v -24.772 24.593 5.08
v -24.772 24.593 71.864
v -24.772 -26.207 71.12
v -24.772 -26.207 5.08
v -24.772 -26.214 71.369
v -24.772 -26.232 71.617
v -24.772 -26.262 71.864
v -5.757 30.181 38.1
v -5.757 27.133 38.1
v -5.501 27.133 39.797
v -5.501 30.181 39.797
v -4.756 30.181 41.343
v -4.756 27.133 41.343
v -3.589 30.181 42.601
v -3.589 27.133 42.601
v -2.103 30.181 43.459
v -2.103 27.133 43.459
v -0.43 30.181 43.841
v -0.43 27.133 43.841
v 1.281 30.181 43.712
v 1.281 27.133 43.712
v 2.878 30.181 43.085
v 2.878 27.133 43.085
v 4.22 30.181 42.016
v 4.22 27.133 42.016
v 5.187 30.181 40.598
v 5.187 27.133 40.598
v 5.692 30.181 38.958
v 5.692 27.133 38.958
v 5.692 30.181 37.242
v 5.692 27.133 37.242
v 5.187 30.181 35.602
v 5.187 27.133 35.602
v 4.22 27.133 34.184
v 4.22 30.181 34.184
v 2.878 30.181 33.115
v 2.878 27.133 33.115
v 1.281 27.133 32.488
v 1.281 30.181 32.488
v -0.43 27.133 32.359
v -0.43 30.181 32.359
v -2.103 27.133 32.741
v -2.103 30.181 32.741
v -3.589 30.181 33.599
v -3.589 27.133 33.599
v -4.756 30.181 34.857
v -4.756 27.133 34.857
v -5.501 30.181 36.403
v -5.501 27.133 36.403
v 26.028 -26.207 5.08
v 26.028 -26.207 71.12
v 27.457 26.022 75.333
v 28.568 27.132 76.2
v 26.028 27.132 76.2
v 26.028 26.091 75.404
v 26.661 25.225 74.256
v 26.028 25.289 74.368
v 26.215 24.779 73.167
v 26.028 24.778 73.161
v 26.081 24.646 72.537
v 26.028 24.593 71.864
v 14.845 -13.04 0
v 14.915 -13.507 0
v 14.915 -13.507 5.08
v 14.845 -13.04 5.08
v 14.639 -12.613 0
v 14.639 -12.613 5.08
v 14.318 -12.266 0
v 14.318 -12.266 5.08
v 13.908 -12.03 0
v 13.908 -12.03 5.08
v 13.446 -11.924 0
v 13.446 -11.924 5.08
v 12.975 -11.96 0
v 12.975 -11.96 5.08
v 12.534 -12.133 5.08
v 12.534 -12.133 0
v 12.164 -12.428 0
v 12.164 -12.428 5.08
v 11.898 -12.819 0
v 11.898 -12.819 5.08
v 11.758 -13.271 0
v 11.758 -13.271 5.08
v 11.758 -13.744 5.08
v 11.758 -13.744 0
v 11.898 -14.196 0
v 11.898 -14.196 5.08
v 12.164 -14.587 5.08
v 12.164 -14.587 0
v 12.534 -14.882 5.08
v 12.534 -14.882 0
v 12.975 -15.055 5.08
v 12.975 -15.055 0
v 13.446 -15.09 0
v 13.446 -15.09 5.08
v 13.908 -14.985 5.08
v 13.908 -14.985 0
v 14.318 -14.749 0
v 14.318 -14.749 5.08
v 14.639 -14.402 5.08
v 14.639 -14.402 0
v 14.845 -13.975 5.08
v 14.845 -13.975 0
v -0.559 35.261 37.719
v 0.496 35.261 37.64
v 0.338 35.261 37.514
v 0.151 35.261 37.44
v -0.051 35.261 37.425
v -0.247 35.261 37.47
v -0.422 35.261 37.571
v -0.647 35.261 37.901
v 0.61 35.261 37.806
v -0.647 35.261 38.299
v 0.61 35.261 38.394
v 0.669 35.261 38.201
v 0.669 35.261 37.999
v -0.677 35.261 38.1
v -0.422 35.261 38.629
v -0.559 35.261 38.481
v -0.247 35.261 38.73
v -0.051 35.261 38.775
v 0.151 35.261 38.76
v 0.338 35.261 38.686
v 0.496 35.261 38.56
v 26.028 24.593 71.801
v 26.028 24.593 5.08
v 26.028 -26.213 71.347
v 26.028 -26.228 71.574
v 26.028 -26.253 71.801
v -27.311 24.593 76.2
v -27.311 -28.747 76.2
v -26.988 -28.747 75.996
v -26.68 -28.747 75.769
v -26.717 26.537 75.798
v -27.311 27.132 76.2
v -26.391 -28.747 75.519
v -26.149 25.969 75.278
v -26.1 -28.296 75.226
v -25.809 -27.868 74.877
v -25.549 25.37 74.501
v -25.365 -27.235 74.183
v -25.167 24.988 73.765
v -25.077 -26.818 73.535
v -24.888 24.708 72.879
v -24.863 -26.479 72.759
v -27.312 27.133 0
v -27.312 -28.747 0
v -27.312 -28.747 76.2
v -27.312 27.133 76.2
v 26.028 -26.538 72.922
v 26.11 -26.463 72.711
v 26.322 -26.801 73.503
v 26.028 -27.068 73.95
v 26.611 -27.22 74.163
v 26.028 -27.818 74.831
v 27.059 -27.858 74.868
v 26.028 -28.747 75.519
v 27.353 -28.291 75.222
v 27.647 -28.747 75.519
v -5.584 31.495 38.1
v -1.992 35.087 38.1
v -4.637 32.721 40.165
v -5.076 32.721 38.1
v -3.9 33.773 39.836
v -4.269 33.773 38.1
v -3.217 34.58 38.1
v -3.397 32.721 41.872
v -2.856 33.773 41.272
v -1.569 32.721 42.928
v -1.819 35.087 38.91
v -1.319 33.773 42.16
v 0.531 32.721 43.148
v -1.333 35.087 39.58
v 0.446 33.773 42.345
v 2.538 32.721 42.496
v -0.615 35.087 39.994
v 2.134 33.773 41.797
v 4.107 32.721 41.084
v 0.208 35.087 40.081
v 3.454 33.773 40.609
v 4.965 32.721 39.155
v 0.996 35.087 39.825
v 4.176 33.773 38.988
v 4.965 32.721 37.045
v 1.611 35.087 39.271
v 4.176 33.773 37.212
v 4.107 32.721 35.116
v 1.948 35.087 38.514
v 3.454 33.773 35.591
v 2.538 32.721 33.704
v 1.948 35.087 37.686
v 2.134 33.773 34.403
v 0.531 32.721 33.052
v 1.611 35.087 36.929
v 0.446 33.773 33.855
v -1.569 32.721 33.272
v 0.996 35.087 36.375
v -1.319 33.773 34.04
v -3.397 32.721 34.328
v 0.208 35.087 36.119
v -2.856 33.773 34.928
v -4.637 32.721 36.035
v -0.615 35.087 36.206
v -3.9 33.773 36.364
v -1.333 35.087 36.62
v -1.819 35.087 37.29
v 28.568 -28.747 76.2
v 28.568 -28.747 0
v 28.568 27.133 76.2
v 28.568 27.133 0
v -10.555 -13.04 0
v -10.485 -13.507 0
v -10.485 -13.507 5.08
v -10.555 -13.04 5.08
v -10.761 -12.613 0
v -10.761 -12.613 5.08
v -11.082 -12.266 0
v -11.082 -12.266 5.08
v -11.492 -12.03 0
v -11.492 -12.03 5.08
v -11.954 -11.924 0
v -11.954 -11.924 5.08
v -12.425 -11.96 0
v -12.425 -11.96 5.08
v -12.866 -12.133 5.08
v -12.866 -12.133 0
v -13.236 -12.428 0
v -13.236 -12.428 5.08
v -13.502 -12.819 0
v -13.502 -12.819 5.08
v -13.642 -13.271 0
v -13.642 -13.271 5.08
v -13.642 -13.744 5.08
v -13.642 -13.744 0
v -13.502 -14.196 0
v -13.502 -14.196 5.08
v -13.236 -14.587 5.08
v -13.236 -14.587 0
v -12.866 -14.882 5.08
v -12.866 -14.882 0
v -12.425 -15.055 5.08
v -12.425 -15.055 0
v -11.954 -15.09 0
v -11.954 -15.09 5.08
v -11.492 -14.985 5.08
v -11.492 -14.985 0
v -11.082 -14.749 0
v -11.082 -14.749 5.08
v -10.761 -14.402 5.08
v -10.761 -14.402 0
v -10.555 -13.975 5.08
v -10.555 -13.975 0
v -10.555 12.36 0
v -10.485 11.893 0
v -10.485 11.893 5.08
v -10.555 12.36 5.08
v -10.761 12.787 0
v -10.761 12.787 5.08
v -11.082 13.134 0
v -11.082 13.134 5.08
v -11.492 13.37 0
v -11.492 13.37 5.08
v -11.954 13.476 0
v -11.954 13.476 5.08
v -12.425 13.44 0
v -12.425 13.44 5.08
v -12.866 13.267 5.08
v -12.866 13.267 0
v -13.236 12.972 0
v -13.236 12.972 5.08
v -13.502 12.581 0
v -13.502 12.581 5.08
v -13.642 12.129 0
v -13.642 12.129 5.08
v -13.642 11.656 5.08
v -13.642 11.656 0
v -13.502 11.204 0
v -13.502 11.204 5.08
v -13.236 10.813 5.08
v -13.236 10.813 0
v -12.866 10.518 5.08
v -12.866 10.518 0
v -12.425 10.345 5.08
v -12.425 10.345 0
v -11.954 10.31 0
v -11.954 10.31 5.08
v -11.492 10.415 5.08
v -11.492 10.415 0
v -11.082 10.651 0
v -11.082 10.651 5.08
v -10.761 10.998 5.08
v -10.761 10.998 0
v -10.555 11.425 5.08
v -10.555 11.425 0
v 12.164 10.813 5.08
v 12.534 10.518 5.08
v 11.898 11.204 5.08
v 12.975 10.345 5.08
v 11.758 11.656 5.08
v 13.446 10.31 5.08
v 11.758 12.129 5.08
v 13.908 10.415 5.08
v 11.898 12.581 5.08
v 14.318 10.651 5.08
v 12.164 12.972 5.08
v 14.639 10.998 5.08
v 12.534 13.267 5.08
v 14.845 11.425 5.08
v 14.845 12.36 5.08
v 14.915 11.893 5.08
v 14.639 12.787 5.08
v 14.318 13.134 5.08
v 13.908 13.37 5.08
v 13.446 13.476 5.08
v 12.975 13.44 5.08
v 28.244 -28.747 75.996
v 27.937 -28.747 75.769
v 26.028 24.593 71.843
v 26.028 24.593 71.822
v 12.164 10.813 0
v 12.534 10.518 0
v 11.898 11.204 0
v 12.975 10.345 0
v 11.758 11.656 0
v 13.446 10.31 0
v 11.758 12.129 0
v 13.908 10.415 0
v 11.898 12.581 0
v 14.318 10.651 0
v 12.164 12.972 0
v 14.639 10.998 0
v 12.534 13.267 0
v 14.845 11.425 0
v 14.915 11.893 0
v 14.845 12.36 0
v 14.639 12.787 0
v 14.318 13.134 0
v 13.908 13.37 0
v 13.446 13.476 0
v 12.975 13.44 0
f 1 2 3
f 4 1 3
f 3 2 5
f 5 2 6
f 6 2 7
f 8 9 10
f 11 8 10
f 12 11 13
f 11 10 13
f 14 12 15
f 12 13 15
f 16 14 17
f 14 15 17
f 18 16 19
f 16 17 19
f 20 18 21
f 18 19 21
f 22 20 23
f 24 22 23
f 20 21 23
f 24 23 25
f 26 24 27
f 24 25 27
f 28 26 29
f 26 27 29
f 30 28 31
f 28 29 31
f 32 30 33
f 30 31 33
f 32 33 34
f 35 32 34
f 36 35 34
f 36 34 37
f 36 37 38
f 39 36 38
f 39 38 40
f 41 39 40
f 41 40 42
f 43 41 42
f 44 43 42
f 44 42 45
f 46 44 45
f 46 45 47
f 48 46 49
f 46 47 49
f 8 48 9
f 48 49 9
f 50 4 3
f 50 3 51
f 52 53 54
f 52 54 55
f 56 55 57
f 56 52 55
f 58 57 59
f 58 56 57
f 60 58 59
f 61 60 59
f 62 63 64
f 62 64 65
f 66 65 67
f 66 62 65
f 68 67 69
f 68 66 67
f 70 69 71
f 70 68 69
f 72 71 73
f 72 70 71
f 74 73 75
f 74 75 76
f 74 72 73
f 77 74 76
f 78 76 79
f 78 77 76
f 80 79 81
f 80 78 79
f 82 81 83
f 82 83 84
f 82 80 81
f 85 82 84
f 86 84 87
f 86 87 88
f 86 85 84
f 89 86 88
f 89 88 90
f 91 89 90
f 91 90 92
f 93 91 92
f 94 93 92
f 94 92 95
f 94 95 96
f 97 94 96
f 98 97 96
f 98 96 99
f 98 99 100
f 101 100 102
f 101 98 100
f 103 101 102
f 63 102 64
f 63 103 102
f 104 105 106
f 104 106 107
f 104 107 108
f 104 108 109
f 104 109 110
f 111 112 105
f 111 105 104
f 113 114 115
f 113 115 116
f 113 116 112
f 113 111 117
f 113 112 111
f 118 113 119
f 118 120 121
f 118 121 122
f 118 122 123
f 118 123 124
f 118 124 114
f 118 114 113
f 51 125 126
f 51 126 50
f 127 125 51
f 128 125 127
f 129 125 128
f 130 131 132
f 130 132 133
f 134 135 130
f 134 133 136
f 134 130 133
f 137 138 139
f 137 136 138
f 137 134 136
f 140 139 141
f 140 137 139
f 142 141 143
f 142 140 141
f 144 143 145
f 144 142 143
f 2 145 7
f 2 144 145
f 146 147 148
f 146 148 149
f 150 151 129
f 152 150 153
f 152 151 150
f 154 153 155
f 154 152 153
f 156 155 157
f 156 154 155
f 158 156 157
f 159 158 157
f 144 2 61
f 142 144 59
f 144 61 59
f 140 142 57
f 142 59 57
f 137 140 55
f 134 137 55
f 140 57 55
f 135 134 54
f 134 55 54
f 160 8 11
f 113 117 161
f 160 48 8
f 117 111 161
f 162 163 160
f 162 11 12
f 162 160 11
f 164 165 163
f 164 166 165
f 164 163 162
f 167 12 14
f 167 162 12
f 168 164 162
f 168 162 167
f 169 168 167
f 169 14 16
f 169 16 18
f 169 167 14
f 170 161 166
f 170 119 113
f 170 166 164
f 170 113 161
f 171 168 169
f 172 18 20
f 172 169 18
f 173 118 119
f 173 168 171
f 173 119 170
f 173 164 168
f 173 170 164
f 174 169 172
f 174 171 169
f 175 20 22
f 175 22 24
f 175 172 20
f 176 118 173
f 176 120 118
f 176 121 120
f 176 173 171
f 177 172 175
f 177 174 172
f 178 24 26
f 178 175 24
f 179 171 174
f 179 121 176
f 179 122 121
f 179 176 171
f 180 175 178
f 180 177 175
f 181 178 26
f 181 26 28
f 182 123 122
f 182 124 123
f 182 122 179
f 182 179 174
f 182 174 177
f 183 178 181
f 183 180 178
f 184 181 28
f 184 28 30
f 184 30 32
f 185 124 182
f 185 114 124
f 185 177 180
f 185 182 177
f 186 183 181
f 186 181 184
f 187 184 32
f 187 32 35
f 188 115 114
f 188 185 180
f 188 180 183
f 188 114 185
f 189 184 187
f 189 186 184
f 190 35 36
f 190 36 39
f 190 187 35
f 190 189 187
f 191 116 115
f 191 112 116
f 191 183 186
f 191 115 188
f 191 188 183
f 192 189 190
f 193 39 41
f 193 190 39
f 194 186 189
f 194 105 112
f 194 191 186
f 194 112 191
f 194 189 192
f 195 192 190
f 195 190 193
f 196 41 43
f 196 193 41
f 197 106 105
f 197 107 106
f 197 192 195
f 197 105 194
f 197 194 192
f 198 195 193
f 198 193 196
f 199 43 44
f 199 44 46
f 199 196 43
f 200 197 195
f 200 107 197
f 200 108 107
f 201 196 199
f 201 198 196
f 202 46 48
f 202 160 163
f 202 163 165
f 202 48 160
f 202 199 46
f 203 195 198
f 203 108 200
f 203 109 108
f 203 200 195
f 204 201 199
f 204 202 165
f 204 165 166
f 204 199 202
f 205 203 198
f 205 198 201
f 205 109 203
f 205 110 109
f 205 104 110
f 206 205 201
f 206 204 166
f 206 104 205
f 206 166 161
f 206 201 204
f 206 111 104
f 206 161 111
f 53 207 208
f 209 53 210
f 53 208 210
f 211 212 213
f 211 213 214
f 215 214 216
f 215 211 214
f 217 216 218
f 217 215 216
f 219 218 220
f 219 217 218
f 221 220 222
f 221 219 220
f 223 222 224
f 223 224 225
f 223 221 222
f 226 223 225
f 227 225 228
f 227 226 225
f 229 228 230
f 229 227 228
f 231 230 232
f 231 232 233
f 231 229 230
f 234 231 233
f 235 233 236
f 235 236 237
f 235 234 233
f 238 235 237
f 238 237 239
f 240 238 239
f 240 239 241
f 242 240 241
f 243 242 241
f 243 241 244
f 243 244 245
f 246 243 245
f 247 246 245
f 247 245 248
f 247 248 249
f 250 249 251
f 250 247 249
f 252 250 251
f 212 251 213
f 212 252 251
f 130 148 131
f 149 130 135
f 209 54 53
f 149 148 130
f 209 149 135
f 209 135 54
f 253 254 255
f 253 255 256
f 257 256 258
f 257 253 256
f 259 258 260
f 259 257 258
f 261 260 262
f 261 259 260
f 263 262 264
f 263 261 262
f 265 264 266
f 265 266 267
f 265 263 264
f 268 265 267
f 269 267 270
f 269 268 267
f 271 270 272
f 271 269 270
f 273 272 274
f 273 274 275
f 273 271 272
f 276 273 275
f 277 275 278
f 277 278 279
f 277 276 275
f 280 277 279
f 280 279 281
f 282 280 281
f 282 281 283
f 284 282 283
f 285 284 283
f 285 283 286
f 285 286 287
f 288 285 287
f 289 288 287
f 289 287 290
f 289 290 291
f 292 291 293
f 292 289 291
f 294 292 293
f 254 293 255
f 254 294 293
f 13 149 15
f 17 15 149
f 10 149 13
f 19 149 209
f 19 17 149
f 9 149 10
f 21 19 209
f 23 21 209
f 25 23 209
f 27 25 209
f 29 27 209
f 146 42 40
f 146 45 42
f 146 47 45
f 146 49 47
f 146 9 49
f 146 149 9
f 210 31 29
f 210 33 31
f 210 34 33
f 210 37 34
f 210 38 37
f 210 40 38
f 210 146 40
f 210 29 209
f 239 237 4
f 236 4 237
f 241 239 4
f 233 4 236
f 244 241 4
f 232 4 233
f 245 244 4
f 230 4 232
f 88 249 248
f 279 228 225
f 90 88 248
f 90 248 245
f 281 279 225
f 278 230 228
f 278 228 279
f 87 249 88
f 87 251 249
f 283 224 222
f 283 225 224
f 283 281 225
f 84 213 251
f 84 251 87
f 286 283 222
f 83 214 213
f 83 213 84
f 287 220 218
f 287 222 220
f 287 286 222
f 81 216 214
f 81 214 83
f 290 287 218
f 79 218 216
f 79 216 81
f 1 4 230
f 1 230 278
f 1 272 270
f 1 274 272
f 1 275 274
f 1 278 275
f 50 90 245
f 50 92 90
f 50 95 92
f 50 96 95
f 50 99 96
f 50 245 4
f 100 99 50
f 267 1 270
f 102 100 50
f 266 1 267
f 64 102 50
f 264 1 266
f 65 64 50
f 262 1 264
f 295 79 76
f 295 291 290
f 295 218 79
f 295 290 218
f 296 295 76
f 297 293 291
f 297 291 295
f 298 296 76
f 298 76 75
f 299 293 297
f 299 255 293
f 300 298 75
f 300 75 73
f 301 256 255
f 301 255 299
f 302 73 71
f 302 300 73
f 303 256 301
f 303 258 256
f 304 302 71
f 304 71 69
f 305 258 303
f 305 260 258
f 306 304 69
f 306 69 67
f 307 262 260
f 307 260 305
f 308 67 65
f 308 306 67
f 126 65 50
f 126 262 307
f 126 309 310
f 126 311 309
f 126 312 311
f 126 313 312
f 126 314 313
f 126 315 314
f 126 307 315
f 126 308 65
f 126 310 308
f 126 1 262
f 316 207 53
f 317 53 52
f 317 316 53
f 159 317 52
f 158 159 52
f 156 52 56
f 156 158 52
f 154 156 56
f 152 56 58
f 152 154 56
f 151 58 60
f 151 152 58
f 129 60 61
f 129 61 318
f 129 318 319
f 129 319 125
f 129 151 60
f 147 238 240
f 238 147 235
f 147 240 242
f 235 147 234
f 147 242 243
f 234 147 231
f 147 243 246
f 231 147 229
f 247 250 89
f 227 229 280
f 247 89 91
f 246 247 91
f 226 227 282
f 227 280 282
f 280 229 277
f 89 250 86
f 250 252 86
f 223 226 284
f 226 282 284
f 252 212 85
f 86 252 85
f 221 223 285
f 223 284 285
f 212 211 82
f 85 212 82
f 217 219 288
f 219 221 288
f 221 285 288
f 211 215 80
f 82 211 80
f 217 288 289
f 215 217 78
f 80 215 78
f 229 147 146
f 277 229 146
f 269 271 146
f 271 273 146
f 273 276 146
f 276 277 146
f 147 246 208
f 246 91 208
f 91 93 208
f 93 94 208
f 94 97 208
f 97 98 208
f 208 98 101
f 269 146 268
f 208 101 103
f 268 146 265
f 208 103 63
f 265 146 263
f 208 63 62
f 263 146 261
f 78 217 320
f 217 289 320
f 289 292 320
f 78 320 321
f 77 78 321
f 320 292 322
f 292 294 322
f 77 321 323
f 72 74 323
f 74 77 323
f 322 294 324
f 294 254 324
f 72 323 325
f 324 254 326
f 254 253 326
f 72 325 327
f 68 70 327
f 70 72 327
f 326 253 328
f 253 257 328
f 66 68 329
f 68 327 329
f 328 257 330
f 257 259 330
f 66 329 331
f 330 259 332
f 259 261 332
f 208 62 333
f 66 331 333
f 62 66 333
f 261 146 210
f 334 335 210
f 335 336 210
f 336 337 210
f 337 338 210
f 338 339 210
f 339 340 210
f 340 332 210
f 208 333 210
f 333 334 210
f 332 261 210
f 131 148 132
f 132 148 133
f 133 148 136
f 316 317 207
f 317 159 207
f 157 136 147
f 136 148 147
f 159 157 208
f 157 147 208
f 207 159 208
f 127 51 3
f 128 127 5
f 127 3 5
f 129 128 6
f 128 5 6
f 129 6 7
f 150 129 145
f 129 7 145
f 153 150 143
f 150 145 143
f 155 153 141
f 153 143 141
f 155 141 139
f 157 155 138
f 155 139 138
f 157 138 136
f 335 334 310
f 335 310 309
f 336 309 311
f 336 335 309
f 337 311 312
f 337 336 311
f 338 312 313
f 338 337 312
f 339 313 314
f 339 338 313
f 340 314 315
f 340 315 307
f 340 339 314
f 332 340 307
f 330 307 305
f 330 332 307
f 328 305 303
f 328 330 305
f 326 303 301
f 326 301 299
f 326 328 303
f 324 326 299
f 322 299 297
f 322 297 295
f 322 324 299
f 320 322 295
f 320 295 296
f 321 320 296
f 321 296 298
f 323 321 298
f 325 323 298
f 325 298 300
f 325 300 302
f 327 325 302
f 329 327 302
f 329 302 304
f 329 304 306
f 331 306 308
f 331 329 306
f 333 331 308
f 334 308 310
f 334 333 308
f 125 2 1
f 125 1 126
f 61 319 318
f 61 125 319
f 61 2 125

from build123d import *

# Parameters (mm, degrees)
F0_W         = 50.8
F0_H         = 50.8
F0_R         = 1.5875
F1_DEPTH     = 5.08
F0_W_2       = 55.88
F0_H_2       = 55.88
F2_DEPTH     = 76.2
F3_T1_DEPTH  = 50.8
F4_T4_DEPTH  = 64.3399164321
F4_S5_R      = 5.0800000001
F4_T6_DEPTH  = 34
F5_T4_DEPTH  = 64.3391166785
F5_S5_R      = 5.0813656856
F5_T6_DEPTH  = 34
F6_T4_DEPTH  = 77.8762455026
F6_S6_R      = 5.0800000001
F6_T7_DEPTH  = 41
F6_T11_DEPTH = 77.8762455026
F6_S13_R     = 5.081365685
F6_T14_DEPTH = 41
F7_R         = 5.7567075364
F8_DEPTH     = 8.128
F9_R         = 5.08


# Not quite as in the source:
# - a fillet or chamfer that OpenCascade refuses, or shapes differently, is made with other operations: its cross-section is extruded or revolved along the edge and cut away or added


with BuildPart() as f1:
    # F0 (on Top) → F1 (new body)
    with BuildSketch(Plane.XY):
        with Locations((0.627800245, -0.8074334759)):
            Rectangle(F0_W, F0_H)
        with Locations((-12.072199755, -13.5074334759)):
            Circle(F0_R, mode=Mode.SUBTRACT)
        with Locations((13.327800245, -13.5074334759)):
            Circle(F0_R, mode=Mode.SUBTRACT)
        with Locations((-12.072199755, 11.8925665241)):
            Circle(F0_R, mode=Mode.SUBTRACT)
        with Locations((13.327800245, 11.8925665241)):
            Circle(F0_R, mode=Mode.SUBTRACT)
    extrude(amount=F1_DEPTH)

    # F0 (on Top) → F2 (join)
    with BuildSketch(Plane.XY):
        with Locations((0.627800245, -0.8074334759)):
            Rectangle(F0_W_2, F0_H_2)
        with Locations((0.627800245, -0.8074334759)):
            Rectangle(F0_W, F0_H, mode=Mode.SUBTRACT)
    extrude(amount=F2_DEPTH)

    # F3: fillet of radius 5.08 on 1 edges, made by hand

    # F3_s2 → F3_t1 (cut)
    with BuildSketch(Plane.YZ.offset(-24.772199755)):
        with BuildLine():
            ThreePointArc((-26.2074334759, 71.12), (-27.6953310275, 74.7121024484), (-31.2874334759, 76.2))
            Line((-31.2874334759, 76.2), (-26.2074334759, 76.2))
            Line((-26.2074334759, 76.2), (-26.2074334759, 71.12))
        make_face()
    extrude(amount=F3_T1_DEPTH, mode=Mode.SUBTRACT)

    # F4: fillet of radius 5.08 on 1 edges, made by hand


with BuildPart() as f4_tool2:
    # F4_s3 → F4_t4 (new body)
    with BuildSketch(Plane.XZ.offset(-24.5925665241)):
        with BuildLine():
            ThreePointArc((-27.311999717, 76.2003463882), (-25.4524342775, 74.3404748362), (-24.771799755, 71.8000334454))
            Line((-24.771799755, 71.8000334454), (-24.2636631865, 71.8000334454))
            ThreePointArc((-24.2636631865, 71.8000334454), (-24.2640631865, 74.0000167227), (-24.2640631865, 76.2))
            Line((-24.2640631865, 76.2), (-24.772199755, 76.7081365685))
            ThreePointArc((-24.772199755, 76.7081365685), (-26.042099736, 76.7081365685), (-27.0578831447, 76.6403776825))
            Line((-27.0578831447, 76.6403776825), (-27.311999717, 76.2003463882))
        make_face()
    extrude(amount=F4_T4_DEPTH)

    # F4_s5 → F4_t6 (cut, symmetric)
    with BuildSketch(Plane.YZ.offset(-25.8)):
        with Locations((-31.287433476, 71.1199999999)):
            Circle(F4_S5_R)
    extrude(amount=F4_T6_DEPTH, both=True, mode=Mode.SUBTRACT)


with BuildPart() as f1_1:
    add(f1.part)

    # F4_t1: cut F4_tool2
    add(f4_tool2.part, mode=Mode.SUBTRACT)

    # F5: fillet of radius 5.08 on 1 edges, made by hand


with BuildPart() as f5_tool2:
    # F5_s3 → F5_t4 (new body)
    with BuildSketch(Plane.YZ.offset(26.027800245)):
        with BuildLine():
            ThreePointArc((24.5921665241, 71.8000334454), (25.2728010465, 74.3404748362), (27.1323664861, 76.2003463882))
            Line((27.1323664861, 76.2003463882), (26.8782499137, 76.6403776825))
            ThreePointArc((26.8782499137, 76.6403776825), (25.8624665051, 76.7081365685), (24.5925665241, 76.7081365685))
            Line((24.5925665241, 76.7081365685), (24.0844299555, 76.2))
            ThreePointArc((24.0844299555, 76.2), (24.0844299555, 74.0000167227), (24.0840299555, 71.8000334454))
            Line((24.0840299555, 71.8000334454), (24.5921665241, 71.8000334454))
        make_face()
    extrude(amount=-F5_T4_DEPTH)

    # F5_s5 → F5_t6 (cut, symmetric)
    with BuildSketch(Plane.XZ.offset(-25.6)):
        with Locations((-29.8531654406, 71.8000334452)):
            Circle(F5_S5_R)
    extrude(amount=F5_T6_DEPTH, both=True, mode=Mode.SUBTRACT)


with BuildPart() as f1_2:
    add(f1_1.part)

    # F5_t1: cut F5_tool2
    add(f5_tool2.part, mode=Mode.SUBTRACT)

    # F6: fillet of radius 5.08 on 1 edges, made by hand


with BuildPart() as f6_tool2:
    # F6_s3 → F6_t4 (new body)
    with BuildSketch(Plane.XZ.offset(39.745956104)):
        with BuildLine():
            ThreePointArc((28.567800245, 76.2), (26.7083911938, 74.3405909488), (26.027800245, 71.8005909488))
            Line((26.027800245, 71.8005909488), (26.027800245, 76.2))
            Line((26.027800245, 76.2), (28.567800245, 76.2))
        make_face()
    extrude(amount=-F6_T4_DEPTH)

    split(bisect_by=Plane.XZ.offset(-24.5925665241), keep=Keep.TOP)

    # F6_s6 → F6_t7 (cut, symmetric)
    with BuildSketch(Plane.YZ.offset(27.3)):
        with Locations((-31.287433476, 71.1199999999)):
            Circle(F6_S6_R)
    extrude(amount=F6_T7_DEPTH, both=True, mode=Mode.SUBTRACT)


with BuildPart() as f1_3:
    add(f1_2.part)

    # F6_t1: cut F6_tool2
    add(f6_tool2.part, mode=Mode.SUBTRACT)


with BuildPart() as f6_tool9:
    # F6_s10 → F6_t11 (new body)
    with BuildSketch(Plane.XZ.offset(39.745956104)):
        with BuildLine():
            ThreePointArc((28.567800245, 76.2), (26.7083911938, 74.3405909488), (26.027800245, 71.8005909488))
            Line((26.027800245, 71.8005909488), (26.027800245, 76.2))
            Line((26.027800245, 76.2), (28.567800245, 76.2))
        make_face()
    extrude(amount=-F6_T11_DEPTH)

    split(bisect_by=Plane.XZ.offset(-24.5925665241), keep=Keep.BOTTOM)

    # F6_s13 → F6_t14 (cut, symmetric)
    with BuildSketch(Plane.YZ.offset(27.3)):
        with Locations((29.6735322091, 71.8000334456)):
            Circle(F6_S13_R)
    extrude(amount=F6_T14_DEPTH, both=True, mode=Mode.SUBTRACT)


with BuildPart() as f1_4:
    add(f1_3.part)

    # F6_t8: cut F6_tool9
    add(f6_tool9.part, mode=Mode.SUBTRACT)

    # F7 (on face) → F8 (join)
    with BuildSketch(Plane(origin=(0, 27.1325665241, 0), x_dir=(-1, 0, 0), z_dir=(0, 1, 0))):
        with Locations((0, 38.1)):
            Circle(F7_R)
    extrude(amount=F8_DEPTH)

    # F9
    f9_edges = [f1_4.edges().sort_by_distance(p)[0] for p in [
        (5.756708, 35.260567, 38.1),
    ]]
    fillet(f9_edges, radius=F9_R)


solid = f1_4.part
